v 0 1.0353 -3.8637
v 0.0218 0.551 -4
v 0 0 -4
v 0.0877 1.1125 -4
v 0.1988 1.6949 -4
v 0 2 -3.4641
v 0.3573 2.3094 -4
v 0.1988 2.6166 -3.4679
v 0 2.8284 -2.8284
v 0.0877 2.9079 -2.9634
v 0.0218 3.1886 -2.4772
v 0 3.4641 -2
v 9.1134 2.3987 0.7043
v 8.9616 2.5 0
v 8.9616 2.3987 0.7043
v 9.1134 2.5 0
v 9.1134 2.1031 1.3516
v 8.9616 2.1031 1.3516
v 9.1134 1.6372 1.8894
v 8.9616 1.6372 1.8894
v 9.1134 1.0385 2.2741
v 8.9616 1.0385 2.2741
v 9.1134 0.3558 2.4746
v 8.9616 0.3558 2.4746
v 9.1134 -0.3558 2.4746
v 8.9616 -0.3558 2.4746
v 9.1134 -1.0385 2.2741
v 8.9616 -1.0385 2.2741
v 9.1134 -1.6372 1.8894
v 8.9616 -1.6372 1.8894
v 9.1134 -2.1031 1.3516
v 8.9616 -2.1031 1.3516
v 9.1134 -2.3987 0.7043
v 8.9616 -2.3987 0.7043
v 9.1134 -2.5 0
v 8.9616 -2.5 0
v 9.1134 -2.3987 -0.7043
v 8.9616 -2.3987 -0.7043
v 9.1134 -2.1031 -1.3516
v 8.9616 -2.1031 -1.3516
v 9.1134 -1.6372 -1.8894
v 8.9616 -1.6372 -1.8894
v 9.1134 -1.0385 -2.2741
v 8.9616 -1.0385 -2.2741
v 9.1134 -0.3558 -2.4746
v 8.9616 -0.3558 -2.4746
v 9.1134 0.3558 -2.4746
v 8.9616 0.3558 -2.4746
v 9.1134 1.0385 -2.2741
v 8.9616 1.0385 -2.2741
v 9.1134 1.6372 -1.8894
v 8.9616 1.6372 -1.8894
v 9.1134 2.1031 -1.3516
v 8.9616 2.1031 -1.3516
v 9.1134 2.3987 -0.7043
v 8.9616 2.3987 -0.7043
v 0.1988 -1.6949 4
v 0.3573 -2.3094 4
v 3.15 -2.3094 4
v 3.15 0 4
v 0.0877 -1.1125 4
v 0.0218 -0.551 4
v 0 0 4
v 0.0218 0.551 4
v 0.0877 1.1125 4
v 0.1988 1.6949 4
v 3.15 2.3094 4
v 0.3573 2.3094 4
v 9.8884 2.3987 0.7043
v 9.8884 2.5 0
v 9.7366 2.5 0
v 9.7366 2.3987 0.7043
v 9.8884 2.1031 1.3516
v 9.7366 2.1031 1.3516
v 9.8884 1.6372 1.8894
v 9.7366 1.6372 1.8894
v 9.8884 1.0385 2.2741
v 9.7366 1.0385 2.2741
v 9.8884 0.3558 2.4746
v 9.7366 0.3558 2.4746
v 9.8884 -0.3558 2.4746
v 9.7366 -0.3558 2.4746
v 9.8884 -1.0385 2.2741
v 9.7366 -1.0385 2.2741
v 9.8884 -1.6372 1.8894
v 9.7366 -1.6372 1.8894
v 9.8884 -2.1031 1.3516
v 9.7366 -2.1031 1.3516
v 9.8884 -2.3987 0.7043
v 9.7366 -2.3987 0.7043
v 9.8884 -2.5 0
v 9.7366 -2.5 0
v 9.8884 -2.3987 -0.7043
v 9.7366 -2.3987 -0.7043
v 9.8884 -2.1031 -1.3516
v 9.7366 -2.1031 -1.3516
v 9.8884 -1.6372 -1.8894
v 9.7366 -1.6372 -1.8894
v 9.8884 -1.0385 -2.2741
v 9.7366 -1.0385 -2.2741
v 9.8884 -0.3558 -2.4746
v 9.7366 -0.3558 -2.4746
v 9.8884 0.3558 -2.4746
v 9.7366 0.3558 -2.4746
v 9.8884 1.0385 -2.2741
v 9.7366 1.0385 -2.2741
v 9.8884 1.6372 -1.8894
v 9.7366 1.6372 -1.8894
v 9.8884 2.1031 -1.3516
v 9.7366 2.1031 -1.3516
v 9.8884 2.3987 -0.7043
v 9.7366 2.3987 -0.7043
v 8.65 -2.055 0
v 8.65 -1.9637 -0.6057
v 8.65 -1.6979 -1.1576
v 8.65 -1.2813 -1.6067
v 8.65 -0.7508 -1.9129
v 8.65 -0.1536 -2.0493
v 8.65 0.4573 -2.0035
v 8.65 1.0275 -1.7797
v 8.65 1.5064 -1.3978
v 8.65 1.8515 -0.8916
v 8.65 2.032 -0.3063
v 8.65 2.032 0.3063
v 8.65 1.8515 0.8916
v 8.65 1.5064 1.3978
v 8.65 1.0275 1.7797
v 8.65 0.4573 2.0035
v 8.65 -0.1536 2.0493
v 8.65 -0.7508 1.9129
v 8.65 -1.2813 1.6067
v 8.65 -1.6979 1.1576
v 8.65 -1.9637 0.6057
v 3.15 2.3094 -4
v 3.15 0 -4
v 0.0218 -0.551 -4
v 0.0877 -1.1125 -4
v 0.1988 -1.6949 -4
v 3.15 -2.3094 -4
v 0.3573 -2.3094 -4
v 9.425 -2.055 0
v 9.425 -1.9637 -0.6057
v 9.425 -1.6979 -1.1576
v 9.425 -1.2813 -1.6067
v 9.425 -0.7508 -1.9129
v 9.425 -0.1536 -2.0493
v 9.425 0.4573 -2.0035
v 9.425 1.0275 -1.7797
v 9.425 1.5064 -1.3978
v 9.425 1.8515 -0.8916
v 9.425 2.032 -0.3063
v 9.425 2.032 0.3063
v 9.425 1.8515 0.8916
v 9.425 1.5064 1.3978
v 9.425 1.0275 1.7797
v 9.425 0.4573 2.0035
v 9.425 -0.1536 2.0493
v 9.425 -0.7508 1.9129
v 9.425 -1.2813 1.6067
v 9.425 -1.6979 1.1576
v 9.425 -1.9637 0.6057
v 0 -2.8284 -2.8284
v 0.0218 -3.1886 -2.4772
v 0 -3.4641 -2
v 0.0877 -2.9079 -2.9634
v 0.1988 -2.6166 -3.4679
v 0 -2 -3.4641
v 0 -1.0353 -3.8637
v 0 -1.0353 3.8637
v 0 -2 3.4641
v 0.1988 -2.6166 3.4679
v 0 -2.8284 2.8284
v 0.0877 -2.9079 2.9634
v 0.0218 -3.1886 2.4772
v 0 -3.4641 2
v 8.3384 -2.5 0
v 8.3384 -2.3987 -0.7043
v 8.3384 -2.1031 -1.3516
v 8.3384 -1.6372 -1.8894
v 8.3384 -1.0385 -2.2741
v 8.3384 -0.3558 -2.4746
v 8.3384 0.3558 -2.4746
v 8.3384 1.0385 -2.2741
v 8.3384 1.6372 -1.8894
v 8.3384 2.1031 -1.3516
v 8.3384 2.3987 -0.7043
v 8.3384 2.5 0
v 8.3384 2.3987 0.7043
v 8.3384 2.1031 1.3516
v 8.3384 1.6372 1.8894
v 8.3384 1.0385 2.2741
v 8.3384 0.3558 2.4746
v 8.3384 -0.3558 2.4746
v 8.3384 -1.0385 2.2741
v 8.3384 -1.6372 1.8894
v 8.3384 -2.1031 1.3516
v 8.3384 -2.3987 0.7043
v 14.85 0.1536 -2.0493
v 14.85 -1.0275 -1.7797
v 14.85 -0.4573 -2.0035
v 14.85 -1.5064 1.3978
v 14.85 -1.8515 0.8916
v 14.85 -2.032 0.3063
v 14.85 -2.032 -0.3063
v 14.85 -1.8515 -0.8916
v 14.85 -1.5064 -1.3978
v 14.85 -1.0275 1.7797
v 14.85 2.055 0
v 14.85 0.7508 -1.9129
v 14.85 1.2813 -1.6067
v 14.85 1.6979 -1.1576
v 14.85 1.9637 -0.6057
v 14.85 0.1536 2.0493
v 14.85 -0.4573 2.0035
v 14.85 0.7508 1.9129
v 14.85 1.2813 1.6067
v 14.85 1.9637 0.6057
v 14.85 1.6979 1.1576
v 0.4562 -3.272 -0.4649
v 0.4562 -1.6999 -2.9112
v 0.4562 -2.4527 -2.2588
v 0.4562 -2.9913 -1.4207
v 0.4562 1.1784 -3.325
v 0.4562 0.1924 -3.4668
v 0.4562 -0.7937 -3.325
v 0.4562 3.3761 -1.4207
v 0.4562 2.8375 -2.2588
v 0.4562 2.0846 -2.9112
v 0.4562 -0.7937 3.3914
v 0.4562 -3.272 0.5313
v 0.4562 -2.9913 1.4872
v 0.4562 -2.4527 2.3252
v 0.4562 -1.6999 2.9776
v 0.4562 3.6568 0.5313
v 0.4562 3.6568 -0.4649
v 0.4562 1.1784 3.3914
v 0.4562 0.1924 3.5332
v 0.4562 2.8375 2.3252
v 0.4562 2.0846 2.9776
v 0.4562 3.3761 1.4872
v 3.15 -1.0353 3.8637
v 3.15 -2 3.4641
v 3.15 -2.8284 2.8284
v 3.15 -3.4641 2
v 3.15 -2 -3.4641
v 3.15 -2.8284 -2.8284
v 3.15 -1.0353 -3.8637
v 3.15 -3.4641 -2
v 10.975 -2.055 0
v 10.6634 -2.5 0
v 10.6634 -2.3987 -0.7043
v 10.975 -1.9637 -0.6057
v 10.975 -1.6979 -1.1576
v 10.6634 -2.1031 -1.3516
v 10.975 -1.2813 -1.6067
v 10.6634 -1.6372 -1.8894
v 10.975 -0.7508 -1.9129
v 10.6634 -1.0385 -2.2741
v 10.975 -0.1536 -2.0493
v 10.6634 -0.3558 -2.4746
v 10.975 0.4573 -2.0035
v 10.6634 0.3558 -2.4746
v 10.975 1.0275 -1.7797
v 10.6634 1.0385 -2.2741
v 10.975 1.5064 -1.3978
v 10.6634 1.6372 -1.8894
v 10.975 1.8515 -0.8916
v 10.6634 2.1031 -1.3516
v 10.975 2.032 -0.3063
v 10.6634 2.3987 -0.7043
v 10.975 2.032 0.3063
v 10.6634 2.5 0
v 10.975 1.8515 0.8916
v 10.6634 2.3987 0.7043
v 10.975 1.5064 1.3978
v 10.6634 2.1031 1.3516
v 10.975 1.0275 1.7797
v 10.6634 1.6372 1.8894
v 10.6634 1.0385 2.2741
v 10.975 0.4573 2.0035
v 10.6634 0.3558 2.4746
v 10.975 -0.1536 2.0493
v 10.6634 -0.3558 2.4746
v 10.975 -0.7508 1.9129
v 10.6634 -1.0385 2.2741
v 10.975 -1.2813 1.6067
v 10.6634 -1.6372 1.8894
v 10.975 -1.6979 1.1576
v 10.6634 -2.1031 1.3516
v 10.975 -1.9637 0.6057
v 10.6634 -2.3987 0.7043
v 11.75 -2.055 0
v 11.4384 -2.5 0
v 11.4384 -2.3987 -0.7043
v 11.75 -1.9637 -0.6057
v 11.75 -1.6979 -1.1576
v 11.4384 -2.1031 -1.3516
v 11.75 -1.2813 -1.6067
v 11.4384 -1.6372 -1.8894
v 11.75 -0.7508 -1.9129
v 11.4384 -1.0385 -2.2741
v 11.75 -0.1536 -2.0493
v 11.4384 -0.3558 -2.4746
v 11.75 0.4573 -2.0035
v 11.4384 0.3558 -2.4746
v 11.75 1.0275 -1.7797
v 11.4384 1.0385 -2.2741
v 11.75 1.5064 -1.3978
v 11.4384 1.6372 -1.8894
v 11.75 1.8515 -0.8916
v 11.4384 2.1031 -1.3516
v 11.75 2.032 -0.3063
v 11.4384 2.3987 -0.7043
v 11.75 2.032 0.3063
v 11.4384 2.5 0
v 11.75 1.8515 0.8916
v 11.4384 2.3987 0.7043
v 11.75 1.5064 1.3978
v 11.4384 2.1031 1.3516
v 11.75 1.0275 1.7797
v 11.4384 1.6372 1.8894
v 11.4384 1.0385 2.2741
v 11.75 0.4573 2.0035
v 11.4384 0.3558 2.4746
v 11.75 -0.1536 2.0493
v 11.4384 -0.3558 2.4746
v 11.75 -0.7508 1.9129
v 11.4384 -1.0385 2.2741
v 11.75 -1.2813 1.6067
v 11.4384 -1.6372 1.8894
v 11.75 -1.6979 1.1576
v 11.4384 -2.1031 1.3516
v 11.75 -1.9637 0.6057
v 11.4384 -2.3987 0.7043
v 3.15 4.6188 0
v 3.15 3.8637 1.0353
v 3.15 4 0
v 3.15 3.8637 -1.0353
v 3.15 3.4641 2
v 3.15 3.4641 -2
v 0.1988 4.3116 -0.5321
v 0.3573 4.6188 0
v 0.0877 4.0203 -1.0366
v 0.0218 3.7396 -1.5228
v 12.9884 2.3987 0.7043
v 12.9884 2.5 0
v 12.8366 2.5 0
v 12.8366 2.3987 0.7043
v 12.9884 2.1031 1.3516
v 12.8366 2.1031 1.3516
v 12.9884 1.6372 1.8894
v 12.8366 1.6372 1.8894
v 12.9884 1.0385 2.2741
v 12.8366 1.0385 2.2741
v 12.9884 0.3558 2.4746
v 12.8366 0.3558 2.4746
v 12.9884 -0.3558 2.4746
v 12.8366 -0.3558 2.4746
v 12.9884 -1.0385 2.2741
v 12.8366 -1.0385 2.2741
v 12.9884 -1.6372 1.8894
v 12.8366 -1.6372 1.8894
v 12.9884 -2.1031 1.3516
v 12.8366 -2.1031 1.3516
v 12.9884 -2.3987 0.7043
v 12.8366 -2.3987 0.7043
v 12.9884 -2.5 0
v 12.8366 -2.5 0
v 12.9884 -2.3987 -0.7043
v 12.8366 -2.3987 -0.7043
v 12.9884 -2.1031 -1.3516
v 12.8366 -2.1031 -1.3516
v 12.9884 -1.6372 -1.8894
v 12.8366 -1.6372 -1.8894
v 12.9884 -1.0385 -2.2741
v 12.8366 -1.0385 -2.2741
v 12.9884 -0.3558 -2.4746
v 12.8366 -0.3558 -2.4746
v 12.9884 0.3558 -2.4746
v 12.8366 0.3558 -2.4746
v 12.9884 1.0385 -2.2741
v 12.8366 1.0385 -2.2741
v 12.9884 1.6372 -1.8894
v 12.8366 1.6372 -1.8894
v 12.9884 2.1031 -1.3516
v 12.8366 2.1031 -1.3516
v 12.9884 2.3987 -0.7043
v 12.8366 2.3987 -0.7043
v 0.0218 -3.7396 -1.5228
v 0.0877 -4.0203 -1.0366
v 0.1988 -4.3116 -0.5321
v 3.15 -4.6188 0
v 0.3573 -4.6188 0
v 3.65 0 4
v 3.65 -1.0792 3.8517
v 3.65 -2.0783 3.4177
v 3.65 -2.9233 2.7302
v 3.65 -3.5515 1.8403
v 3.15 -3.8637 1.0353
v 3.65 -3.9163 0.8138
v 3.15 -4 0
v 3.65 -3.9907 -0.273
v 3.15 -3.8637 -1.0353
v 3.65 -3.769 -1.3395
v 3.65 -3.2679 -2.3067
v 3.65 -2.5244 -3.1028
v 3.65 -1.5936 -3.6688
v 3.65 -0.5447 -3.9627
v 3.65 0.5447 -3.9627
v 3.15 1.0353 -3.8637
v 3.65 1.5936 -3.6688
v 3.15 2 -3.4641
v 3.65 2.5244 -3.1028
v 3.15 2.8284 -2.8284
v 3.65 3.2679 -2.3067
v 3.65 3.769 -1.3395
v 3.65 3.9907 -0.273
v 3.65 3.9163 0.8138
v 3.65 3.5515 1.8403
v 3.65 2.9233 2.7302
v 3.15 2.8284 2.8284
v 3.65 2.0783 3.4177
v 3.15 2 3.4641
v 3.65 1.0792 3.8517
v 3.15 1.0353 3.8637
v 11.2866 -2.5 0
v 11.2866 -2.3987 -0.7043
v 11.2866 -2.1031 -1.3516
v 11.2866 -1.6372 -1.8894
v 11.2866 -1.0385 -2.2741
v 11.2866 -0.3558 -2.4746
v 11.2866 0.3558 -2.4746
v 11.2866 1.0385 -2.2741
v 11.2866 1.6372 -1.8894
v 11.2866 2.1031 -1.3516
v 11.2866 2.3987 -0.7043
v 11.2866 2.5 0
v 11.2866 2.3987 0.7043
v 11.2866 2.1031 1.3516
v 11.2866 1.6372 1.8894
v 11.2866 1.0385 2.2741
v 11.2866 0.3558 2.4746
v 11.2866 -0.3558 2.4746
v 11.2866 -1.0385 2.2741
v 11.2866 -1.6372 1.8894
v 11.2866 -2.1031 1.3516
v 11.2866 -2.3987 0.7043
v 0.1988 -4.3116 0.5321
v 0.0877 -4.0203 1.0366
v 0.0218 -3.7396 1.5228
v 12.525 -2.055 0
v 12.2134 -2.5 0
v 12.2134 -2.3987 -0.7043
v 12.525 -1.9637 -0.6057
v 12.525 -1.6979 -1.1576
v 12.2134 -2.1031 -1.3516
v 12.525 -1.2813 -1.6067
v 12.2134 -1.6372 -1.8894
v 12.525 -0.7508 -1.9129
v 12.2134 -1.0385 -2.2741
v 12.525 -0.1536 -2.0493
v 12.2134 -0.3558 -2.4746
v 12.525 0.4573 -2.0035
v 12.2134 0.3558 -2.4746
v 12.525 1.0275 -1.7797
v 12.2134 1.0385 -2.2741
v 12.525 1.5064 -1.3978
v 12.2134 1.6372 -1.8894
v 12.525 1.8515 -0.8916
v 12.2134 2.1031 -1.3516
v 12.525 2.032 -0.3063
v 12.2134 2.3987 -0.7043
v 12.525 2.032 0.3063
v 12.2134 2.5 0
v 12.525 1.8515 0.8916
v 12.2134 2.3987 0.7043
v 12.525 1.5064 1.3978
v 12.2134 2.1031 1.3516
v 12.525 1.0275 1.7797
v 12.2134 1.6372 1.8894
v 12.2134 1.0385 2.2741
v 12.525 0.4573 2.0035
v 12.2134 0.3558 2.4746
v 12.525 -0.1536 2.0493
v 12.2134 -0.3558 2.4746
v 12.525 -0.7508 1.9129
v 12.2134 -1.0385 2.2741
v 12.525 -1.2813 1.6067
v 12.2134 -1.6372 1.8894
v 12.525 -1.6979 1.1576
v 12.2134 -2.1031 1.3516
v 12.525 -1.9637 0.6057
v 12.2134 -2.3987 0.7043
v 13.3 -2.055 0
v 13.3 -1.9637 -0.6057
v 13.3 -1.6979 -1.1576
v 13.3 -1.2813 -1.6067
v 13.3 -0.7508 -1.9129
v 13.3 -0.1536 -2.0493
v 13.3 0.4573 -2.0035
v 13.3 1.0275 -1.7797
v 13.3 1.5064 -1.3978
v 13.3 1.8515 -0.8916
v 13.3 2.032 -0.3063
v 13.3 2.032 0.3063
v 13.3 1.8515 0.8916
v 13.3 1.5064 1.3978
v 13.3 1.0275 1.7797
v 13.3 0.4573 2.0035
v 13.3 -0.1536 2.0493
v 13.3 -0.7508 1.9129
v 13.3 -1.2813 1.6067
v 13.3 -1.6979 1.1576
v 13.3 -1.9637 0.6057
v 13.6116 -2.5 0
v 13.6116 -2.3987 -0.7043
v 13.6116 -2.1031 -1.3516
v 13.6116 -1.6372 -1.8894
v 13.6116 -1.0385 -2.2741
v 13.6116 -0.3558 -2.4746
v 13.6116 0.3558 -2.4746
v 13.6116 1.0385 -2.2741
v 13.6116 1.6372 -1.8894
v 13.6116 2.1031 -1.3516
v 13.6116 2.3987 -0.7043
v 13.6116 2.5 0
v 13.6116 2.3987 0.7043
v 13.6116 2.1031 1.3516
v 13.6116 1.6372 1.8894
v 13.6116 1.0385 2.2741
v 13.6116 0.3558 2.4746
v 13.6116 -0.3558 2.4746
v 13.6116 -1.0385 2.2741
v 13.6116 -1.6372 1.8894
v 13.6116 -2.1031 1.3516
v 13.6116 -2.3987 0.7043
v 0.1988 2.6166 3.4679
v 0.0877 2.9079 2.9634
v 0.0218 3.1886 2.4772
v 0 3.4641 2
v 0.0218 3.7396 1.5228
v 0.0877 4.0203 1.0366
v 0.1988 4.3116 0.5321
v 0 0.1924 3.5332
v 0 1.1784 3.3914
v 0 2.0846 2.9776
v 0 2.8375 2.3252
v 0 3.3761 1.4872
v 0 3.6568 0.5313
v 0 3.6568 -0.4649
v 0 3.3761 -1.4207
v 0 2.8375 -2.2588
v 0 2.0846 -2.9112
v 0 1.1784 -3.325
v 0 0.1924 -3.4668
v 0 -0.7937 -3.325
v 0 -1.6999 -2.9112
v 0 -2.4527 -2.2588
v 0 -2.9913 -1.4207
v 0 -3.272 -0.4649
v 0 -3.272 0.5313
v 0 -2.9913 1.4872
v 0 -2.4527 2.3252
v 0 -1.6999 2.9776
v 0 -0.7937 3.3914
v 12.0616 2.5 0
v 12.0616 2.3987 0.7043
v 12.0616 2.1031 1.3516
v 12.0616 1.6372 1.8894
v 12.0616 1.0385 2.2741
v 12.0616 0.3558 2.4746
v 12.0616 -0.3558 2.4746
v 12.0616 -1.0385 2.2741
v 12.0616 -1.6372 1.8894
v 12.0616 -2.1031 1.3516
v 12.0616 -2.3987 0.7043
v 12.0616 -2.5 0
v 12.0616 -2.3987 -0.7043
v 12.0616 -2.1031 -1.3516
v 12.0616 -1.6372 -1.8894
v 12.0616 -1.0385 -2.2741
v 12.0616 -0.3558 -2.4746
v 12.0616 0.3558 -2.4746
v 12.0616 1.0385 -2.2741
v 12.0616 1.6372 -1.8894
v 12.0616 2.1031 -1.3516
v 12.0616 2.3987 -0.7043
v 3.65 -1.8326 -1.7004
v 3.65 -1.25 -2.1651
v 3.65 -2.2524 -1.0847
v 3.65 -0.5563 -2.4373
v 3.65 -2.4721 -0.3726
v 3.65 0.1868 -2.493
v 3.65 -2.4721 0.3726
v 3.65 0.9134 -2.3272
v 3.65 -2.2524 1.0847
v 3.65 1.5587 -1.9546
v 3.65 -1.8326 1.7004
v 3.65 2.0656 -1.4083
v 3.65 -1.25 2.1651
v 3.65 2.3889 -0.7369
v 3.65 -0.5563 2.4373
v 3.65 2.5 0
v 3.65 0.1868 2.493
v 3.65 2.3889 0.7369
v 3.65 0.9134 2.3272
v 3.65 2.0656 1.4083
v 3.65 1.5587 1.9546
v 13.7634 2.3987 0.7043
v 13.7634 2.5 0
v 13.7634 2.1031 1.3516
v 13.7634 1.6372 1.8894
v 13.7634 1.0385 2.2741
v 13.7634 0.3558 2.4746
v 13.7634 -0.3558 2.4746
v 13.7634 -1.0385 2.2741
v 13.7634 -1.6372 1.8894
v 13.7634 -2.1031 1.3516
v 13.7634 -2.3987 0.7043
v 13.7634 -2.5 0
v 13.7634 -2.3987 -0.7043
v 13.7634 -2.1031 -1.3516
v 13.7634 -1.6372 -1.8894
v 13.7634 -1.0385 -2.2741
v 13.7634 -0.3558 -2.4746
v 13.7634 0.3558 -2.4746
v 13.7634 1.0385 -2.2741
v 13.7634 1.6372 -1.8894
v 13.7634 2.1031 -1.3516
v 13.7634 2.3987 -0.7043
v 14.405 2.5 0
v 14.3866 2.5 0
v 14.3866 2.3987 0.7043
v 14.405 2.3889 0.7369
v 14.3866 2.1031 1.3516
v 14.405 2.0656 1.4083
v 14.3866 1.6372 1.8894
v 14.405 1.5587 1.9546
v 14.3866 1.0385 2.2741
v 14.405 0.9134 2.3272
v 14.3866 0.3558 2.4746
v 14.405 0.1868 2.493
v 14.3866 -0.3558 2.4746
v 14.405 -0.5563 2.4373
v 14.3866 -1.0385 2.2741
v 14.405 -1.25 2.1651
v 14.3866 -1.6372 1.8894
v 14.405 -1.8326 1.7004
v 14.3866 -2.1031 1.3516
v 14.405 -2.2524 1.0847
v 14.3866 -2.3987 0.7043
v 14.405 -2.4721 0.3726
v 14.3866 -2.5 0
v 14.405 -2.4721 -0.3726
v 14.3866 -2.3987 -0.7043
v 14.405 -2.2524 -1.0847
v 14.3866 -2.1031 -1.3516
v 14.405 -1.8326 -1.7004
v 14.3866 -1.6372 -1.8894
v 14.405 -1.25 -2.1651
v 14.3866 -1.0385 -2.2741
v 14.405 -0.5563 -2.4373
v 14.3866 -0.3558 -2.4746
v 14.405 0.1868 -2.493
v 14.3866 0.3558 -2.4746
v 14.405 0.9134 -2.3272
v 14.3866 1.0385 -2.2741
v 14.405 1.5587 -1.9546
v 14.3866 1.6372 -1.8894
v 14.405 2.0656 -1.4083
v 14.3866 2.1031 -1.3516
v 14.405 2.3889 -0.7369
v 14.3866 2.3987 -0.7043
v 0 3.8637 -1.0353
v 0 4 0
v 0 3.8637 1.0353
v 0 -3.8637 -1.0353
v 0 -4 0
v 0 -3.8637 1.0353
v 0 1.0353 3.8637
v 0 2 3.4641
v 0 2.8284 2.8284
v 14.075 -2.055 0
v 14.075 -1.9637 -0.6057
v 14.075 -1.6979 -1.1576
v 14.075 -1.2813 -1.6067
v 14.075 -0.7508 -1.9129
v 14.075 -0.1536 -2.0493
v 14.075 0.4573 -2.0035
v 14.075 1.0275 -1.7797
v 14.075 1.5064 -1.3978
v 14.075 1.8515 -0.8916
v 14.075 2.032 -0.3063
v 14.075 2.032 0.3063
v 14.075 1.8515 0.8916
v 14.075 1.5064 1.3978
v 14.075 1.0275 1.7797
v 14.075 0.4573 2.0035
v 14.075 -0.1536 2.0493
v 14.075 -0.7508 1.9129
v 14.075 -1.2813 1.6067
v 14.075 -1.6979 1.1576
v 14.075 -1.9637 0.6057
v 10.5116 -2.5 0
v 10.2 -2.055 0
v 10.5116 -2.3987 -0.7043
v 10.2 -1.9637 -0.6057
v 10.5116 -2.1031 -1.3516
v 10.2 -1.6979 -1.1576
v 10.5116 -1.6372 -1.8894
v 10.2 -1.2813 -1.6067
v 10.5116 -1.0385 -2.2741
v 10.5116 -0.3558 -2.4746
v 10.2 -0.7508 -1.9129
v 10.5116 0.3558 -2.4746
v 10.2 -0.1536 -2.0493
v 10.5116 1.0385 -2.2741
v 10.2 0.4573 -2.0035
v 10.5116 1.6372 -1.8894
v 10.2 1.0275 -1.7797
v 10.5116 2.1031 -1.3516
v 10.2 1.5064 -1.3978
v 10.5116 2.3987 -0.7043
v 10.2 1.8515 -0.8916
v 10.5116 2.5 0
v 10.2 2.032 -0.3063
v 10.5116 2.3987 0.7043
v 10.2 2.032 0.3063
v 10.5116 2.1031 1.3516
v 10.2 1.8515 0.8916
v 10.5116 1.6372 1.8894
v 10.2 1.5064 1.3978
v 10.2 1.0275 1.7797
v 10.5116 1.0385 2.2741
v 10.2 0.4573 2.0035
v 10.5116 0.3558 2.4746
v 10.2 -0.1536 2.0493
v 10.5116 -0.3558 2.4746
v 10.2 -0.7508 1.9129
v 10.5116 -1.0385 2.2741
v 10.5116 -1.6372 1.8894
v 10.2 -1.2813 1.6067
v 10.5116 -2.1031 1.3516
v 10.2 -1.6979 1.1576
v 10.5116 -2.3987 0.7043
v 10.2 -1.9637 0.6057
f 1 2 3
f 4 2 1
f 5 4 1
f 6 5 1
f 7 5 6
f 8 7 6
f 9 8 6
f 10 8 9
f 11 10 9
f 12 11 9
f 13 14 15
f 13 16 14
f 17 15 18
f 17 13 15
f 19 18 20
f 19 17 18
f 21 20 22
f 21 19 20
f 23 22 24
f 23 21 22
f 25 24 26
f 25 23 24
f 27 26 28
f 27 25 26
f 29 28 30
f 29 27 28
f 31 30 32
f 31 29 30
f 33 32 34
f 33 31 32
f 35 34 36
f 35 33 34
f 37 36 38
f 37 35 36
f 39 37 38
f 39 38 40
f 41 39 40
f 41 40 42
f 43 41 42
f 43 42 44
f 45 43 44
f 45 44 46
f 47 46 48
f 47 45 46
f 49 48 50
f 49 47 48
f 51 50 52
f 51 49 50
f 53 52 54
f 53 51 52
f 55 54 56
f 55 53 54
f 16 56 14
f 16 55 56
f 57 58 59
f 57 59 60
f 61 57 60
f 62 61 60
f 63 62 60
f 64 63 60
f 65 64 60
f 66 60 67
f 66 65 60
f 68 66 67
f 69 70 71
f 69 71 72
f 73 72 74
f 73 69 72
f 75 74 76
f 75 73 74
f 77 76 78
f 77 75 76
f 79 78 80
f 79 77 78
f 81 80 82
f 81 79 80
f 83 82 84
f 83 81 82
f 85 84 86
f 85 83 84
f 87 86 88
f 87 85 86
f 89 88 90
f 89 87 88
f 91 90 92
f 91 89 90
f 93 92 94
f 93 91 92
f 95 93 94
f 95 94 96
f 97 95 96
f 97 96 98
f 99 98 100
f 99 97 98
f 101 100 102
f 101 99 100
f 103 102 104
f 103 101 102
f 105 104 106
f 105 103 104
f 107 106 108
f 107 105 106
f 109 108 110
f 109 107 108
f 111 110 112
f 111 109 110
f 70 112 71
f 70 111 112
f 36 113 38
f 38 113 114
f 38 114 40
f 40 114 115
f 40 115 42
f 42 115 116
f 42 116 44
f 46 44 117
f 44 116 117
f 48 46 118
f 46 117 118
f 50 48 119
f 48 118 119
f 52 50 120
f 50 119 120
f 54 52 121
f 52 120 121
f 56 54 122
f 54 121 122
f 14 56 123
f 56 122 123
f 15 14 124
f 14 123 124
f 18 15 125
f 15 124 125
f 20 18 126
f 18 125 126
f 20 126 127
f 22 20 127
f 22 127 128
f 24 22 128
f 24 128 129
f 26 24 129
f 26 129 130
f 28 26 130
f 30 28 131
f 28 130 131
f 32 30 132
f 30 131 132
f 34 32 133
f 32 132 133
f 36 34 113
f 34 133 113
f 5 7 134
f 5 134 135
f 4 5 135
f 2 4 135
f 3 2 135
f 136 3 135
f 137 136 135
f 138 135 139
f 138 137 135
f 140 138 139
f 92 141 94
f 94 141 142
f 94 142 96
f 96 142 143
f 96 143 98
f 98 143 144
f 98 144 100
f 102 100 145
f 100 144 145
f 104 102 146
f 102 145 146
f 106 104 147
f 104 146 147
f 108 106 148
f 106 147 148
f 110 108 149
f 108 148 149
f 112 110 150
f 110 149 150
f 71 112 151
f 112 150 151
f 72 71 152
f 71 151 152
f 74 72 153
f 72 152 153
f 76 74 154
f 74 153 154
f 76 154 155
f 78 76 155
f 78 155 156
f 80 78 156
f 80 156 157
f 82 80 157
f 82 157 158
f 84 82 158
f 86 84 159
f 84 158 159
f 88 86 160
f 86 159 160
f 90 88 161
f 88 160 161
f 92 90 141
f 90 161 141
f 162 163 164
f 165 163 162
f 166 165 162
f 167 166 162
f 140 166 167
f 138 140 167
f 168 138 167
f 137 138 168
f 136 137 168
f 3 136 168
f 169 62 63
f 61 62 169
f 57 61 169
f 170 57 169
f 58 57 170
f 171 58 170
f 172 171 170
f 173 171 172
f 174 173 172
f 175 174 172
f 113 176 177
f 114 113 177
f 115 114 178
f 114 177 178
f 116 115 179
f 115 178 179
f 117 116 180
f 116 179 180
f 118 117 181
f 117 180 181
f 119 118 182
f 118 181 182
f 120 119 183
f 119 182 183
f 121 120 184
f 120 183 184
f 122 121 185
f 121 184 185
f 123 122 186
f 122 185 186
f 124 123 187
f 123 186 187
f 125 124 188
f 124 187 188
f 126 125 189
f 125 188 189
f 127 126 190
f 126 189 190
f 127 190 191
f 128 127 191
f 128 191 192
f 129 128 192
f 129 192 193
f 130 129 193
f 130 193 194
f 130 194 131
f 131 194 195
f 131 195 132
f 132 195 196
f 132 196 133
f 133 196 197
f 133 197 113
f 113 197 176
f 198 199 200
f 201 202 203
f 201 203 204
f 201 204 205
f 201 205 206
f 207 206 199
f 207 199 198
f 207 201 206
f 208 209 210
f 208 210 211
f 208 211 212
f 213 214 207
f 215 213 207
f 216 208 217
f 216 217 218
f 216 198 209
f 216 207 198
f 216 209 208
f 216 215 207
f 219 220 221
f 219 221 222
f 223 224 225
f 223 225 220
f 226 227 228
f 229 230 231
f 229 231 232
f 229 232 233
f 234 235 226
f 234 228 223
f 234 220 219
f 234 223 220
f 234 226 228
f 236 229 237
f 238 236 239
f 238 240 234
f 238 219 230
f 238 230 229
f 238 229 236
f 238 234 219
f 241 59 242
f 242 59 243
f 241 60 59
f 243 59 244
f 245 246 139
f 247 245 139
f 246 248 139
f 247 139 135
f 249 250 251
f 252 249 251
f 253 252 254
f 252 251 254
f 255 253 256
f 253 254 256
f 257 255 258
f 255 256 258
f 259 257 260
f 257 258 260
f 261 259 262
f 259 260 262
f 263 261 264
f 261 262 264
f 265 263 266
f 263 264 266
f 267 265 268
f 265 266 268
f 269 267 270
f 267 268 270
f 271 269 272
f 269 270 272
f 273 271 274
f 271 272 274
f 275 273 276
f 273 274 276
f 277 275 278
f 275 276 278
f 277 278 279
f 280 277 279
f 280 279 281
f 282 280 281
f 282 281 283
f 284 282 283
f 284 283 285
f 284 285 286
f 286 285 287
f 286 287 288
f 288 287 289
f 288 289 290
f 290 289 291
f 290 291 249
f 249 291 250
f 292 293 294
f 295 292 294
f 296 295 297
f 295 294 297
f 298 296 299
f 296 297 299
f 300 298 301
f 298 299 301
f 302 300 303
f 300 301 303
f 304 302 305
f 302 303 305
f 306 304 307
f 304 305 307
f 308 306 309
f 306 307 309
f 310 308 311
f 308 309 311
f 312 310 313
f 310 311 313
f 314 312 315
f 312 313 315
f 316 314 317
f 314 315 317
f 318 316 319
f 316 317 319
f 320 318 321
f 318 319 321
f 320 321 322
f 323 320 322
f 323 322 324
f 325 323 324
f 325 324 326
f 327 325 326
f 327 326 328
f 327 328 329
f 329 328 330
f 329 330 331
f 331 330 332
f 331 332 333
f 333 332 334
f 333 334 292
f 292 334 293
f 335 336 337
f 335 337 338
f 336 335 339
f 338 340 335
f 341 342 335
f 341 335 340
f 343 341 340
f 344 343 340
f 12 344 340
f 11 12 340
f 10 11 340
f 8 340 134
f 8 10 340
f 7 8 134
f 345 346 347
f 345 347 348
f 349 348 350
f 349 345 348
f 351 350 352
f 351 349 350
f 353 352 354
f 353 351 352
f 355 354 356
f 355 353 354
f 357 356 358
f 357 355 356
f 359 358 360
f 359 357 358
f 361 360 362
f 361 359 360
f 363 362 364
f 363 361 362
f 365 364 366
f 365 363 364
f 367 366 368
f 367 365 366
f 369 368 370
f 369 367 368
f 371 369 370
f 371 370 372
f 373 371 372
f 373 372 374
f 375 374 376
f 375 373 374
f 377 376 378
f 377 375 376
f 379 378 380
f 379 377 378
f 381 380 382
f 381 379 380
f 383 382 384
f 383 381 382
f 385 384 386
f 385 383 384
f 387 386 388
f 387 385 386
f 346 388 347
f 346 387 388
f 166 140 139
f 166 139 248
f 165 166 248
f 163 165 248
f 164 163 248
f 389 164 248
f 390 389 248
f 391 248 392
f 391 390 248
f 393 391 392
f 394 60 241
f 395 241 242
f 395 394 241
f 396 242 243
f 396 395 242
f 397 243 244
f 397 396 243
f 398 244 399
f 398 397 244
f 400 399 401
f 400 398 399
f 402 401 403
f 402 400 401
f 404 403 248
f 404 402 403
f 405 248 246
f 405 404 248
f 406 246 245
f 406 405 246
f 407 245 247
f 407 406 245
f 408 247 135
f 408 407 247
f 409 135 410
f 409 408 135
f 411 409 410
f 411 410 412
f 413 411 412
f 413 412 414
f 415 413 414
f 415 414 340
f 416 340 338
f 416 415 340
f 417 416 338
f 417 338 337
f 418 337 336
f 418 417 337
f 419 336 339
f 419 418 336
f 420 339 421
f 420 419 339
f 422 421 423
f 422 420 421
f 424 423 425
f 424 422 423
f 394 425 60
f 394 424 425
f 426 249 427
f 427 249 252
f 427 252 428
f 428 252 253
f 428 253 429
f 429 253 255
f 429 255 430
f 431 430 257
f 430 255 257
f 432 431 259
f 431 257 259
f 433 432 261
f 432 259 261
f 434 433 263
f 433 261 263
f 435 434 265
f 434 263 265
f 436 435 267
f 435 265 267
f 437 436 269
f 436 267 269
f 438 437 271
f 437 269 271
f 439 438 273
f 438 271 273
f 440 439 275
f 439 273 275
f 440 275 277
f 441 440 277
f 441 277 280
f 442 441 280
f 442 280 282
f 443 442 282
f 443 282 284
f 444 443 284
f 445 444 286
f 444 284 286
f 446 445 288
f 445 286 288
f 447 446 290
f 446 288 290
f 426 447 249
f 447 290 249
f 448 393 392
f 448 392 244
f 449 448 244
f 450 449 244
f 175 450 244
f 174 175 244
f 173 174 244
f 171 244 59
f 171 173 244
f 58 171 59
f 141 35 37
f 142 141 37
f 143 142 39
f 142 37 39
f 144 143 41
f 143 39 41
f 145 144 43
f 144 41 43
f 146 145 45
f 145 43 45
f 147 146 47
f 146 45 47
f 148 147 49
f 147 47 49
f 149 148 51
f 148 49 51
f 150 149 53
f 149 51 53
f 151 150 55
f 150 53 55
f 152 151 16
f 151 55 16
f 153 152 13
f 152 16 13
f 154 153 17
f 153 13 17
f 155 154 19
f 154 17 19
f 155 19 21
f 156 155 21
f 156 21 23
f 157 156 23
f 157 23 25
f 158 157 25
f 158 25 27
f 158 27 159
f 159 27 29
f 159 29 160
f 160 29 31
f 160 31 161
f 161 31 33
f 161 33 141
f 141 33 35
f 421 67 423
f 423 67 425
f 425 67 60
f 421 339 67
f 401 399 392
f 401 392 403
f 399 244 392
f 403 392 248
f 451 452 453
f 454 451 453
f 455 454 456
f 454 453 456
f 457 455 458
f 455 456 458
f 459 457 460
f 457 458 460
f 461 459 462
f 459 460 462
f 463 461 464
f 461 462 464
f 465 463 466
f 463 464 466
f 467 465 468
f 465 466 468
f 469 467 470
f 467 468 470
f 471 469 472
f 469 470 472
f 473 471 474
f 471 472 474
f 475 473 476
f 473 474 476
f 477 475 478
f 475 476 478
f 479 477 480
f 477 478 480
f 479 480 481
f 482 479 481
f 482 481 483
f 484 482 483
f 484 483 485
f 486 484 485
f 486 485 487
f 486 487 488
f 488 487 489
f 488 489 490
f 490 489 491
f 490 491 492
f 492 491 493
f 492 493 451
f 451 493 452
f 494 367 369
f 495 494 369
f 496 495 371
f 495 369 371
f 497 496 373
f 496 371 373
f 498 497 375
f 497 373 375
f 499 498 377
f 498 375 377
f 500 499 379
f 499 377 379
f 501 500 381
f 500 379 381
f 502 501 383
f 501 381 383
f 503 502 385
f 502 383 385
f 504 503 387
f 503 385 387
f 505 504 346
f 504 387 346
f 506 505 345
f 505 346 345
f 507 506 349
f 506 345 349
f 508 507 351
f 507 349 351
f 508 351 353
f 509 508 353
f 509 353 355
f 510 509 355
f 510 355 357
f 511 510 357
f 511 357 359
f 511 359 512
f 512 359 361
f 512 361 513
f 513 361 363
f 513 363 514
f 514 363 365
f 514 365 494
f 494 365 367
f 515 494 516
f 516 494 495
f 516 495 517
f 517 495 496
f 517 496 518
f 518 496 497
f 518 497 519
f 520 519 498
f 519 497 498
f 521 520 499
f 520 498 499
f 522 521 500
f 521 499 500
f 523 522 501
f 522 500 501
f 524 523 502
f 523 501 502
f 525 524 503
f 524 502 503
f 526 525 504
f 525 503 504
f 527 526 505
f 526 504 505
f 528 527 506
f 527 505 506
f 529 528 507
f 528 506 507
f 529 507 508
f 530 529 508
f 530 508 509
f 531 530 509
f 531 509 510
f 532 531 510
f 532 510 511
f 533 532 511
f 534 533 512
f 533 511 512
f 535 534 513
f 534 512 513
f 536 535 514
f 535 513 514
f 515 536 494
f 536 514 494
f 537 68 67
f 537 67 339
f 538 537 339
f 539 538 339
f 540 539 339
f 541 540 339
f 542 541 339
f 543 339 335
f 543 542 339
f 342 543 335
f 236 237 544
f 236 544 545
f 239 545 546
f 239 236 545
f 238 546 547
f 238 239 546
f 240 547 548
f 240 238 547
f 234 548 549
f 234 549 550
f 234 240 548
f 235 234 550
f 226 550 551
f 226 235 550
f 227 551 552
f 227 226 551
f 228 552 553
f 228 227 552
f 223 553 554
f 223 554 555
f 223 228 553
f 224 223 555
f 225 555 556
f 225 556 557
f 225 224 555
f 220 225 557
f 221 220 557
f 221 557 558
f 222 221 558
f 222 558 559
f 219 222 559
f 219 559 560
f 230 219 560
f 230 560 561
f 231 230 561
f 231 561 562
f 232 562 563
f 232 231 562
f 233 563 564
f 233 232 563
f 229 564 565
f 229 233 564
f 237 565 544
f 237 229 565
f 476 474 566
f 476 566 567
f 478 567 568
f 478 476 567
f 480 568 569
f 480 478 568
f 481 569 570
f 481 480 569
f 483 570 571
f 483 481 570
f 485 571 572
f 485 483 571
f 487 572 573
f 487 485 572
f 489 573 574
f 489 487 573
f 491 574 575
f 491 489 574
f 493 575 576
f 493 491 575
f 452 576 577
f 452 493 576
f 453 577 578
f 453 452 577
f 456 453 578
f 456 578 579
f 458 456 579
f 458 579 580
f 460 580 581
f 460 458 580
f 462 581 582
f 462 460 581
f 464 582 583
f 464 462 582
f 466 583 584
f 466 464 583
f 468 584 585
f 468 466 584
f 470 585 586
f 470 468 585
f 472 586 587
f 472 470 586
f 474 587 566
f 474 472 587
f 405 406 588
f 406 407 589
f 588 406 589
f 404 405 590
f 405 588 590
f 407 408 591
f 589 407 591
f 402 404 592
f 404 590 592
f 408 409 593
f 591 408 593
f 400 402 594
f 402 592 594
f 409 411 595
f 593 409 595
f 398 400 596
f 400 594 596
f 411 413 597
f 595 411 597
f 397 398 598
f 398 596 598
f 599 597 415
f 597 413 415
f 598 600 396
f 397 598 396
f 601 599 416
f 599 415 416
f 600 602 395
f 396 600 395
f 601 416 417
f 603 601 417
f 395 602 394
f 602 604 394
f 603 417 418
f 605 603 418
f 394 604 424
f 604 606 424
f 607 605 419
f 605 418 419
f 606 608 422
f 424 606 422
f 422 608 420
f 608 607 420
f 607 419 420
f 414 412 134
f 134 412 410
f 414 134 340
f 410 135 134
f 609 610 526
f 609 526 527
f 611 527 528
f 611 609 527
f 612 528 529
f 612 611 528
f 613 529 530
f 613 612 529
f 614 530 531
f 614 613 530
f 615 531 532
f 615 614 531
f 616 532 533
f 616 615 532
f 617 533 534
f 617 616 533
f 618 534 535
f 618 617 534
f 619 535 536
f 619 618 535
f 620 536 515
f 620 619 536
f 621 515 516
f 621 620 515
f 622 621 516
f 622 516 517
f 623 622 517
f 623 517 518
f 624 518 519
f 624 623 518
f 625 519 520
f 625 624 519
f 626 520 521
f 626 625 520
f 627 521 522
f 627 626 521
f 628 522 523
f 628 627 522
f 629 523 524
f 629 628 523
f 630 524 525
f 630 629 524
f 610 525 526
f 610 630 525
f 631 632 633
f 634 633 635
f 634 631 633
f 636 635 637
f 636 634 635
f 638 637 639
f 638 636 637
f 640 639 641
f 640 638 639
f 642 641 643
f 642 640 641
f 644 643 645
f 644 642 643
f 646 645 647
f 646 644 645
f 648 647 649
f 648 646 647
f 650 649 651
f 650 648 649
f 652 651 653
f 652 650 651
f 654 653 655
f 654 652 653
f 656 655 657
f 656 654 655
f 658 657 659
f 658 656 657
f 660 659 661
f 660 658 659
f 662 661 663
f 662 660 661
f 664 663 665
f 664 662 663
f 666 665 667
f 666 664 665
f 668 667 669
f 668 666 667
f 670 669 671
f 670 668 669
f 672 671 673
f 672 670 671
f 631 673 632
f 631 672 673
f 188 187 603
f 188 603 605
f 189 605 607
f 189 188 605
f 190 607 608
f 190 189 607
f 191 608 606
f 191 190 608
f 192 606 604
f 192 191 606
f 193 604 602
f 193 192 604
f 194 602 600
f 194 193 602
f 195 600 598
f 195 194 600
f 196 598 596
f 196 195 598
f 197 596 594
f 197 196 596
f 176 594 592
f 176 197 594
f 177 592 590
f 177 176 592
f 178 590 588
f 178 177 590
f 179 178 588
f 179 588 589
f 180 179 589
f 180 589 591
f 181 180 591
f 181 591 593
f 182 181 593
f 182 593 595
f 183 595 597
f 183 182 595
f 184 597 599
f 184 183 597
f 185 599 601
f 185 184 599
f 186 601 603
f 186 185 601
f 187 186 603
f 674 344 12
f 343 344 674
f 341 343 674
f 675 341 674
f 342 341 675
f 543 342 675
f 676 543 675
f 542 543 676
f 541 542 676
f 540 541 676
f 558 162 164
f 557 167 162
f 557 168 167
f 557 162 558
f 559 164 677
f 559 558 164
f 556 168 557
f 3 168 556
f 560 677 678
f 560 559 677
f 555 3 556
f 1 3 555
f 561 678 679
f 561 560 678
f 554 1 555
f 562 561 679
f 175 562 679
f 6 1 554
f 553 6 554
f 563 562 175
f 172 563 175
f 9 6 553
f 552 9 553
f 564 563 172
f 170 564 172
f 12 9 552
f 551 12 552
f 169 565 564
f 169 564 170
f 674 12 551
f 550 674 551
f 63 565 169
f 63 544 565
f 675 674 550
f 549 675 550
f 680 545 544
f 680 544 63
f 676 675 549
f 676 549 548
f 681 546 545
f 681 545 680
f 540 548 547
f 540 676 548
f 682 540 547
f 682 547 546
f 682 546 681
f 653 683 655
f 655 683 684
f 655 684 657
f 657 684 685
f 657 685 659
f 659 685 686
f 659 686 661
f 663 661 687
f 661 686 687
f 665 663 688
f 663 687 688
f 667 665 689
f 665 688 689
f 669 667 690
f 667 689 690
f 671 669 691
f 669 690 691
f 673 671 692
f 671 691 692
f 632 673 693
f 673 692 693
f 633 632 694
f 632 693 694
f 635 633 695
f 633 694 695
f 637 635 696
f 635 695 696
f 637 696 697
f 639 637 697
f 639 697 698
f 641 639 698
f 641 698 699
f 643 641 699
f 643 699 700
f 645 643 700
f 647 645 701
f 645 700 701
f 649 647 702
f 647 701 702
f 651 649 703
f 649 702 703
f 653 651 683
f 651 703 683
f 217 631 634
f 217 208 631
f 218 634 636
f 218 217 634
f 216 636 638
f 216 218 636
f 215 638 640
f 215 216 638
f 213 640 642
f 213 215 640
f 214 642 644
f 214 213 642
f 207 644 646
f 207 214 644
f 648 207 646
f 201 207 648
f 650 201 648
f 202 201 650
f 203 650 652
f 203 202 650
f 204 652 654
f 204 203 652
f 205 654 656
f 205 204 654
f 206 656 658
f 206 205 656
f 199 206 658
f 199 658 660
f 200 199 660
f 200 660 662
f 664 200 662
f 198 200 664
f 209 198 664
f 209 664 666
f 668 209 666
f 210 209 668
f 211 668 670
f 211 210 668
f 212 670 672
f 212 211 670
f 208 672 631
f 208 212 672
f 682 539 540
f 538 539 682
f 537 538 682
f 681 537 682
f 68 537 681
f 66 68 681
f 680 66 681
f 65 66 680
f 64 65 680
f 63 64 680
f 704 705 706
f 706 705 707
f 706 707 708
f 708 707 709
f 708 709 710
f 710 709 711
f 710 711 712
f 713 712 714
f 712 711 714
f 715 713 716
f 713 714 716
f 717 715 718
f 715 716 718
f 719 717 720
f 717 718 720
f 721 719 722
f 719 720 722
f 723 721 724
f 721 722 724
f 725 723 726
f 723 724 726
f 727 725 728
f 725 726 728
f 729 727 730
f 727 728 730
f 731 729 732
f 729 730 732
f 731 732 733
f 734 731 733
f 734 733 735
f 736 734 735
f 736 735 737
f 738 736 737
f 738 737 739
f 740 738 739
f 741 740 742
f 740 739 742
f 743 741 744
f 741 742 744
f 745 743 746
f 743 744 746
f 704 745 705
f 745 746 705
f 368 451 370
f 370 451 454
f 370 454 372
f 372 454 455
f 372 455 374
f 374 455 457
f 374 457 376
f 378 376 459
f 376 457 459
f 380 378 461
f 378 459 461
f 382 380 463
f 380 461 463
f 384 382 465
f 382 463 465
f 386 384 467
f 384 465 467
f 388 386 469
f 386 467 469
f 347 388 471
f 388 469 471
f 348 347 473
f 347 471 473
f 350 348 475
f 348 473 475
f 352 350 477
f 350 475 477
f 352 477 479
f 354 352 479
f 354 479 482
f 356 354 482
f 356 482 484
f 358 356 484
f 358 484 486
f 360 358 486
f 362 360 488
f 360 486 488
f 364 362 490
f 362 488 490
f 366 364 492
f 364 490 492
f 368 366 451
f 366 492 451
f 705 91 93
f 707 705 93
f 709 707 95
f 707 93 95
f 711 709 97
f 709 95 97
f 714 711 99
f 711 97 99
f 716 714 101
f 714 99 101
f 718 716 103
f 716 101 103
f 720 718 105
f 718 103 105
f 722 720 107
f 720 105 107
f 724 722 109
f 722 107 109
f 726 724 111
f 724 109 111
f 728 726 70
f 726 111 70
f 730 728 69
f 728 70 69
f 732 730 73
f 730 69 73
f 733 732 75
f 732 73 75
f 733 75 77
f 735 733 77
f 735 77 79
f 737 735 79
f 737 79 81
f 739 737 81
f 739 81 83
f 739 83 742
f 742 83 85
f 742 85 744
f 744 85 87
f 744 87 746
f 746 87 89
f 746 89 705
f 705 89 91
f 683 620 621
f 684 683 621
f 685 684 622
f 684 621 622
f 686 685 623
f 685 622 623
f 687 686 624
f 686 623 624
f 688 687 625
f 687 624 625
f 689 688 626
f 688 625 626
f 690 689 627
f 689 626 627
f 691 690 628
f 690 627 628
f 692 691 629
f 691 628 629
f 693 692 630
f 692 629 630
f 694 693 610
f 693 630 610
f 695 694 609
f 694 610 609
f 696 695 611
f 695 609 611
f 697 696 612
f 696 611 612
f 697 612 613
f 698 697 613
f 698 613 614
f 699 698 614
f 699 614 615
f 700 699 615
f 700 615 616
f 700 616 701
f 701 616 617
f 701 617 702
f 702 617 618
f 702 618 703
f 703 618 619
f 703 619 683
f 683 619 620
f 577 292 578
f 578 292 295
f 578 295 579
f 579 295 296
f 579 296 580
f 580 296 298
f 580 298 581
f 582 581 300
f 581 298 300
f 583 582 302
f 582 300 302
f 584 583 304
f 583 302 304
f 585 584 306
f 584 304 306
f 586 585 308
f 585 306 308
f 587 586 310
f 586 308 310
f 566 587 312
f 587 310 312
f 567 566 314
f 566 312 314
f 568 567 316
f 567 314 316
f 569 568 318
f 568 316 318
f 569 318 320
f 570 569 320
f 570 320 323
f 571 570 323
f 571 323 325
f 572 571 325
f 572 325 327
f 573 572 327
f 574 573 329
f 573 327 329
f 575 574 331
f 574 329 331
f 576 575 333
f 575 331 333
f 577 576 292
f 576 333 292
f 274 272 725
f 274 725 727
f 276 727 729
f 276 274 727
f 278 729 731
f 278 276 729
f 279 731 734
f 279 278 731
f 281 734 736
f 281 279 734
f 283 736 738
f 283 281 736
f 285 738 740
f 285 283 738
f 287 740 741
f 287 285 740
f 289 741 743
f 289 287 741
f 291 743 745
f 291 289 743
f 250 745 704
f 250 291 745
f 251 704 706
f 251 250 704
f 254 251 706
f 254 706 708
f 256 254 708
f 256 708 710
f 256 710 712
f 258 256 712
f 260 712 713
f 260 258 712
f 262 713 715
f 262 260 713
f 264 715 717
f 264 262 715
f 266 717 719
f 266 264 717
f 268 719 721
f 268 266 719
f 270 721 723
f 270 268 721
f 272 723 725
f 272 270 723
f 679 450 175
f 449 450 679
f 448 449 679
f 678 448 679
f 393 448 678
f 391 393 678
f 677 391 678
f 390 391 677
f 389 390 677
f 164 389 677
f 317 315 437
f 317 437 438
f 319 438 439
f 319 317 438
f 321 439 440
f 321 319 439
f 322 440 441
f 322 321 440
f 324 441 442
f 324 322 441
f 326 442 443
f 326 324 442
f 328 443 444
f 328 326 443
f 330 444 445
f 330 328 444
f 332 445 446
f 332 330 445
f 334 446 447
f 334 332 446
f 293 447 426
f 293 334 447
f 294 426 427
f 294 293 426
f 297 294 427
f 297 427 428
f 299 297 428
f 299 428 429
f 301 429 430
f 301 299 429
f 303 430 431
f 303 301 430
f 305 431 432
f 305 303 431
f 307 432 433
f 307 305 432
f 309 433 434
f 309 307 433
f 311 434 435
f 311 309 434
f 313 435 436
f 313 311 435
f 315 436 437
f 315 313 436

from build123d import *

# Parameters (mm, degrees)
BASEHEAD_DEPTH     = 3.65
INDENT_START       = -0.45625
INDENT_2_OUTLINE_R = 3.5
INDENT_2_DEPTH     = 0.45625
SKETCH4_W          = 0.5
SKETCH4_H          = 10.618802154
THDSCHPAT_COUNT    = 8
THDSCHPAT_PITCH    = 0.775


# Read off the part's stored shape, not the designer's step: Indent
with BuildPart() as part:
    # Sketch1 → BaseHead (new body)
    with BuildSketch(Plane(origin=(0, 0, 0), x_dir=(0, 0, -1), z_dir=(1, 0, 0))):
        Polygon((4, 2.309401077), (4, -2.309401077), (0, -4.618802154), (-4, -2.309401077), (-4, 2.309401077), (0, 4.618802154), align=None)
    extrude(amount=BASEHEAD_DEPTH)

    # Indent outline → Indent (revolve)
    with BuildSketch(Plane.YX):
        Polygon((2.5, 3.65), (2.5, 14.405), (2.055, 14.85), (0, 14.85), (0, 3.65), align=None)
    revolve(axis=Axis((0, 0, 0), (1, 0, 0)))

    # Indent 2 outline → Indent 2 (cut)
    with BuildSketch(Plane.ZY.offset(INDENT_START)):
        with Locations((0.033212245, 0.192376607)):
            Circle(INDENT_2_OUTLINE_R)
    extrude(amount=INDENT_2_DEPTH, mode=Mode.SUBTRACT)

    # Sketch3 → HeadChamfer (revolve, cut)
    with BuildSketch(Plane.XY, mode=Mode.PRIVATE) as headchamfer_sk:
        Polygon((0, 4), (3.244016936, 9.618802154), (3.244016936, 14.618802154), (-10, 14.618802154), (-10, 4), align=None)
    revolve(headchamfer_sk.sketch.rotate(Axis((0, 0, 0), (1, 0, 0)), 90), axis=Axis((0, 0, 0), (1, 0, 0)), mode=Mode.SUBTRACT)

    # Sketch4 → BearingFace (revolve, cut)
    with BuildSketch(Plane.XY, mode=Mode.PRIVATE) as bearingface_sk:
        with Locations((3.4, 9.309401077)):
            Rectangle(SKETCH4_W, SKETCH4_H)
    revolve(bearingface_sk.sketch.rotate(Axis((0, 0, 0), (1, 0, 0)), 90), axis=Axis((0, 0, 0), (1, 0, 0)), mode=Mode.SUBTRACT)

    # ThdSchSke → ThreadSchematic (revolve, cut)
    with BuildSketch(Plane.XY):
        Polygon((8.65, -2.055), (8.338407645, -2.5), (8.338407645, -3.125), (8.961592355, -3.125), (8.961592355, -2.5), align=None)
    threadschematic = revolve(axis=Axis((-3.175, 0, 0), (1, 0, 0)), mode=Mode.SUBTRACT)

    # ThdSchPat: ThreadSchematic ×8
    with Locations(*[(i * THDSCHPAT_PITCH, 0, 0) for i in range(1, THDSCHPAT_COUNT)]):
        add(threadschematic, mode=Mode.SUBTRACT)


solid = part.part
